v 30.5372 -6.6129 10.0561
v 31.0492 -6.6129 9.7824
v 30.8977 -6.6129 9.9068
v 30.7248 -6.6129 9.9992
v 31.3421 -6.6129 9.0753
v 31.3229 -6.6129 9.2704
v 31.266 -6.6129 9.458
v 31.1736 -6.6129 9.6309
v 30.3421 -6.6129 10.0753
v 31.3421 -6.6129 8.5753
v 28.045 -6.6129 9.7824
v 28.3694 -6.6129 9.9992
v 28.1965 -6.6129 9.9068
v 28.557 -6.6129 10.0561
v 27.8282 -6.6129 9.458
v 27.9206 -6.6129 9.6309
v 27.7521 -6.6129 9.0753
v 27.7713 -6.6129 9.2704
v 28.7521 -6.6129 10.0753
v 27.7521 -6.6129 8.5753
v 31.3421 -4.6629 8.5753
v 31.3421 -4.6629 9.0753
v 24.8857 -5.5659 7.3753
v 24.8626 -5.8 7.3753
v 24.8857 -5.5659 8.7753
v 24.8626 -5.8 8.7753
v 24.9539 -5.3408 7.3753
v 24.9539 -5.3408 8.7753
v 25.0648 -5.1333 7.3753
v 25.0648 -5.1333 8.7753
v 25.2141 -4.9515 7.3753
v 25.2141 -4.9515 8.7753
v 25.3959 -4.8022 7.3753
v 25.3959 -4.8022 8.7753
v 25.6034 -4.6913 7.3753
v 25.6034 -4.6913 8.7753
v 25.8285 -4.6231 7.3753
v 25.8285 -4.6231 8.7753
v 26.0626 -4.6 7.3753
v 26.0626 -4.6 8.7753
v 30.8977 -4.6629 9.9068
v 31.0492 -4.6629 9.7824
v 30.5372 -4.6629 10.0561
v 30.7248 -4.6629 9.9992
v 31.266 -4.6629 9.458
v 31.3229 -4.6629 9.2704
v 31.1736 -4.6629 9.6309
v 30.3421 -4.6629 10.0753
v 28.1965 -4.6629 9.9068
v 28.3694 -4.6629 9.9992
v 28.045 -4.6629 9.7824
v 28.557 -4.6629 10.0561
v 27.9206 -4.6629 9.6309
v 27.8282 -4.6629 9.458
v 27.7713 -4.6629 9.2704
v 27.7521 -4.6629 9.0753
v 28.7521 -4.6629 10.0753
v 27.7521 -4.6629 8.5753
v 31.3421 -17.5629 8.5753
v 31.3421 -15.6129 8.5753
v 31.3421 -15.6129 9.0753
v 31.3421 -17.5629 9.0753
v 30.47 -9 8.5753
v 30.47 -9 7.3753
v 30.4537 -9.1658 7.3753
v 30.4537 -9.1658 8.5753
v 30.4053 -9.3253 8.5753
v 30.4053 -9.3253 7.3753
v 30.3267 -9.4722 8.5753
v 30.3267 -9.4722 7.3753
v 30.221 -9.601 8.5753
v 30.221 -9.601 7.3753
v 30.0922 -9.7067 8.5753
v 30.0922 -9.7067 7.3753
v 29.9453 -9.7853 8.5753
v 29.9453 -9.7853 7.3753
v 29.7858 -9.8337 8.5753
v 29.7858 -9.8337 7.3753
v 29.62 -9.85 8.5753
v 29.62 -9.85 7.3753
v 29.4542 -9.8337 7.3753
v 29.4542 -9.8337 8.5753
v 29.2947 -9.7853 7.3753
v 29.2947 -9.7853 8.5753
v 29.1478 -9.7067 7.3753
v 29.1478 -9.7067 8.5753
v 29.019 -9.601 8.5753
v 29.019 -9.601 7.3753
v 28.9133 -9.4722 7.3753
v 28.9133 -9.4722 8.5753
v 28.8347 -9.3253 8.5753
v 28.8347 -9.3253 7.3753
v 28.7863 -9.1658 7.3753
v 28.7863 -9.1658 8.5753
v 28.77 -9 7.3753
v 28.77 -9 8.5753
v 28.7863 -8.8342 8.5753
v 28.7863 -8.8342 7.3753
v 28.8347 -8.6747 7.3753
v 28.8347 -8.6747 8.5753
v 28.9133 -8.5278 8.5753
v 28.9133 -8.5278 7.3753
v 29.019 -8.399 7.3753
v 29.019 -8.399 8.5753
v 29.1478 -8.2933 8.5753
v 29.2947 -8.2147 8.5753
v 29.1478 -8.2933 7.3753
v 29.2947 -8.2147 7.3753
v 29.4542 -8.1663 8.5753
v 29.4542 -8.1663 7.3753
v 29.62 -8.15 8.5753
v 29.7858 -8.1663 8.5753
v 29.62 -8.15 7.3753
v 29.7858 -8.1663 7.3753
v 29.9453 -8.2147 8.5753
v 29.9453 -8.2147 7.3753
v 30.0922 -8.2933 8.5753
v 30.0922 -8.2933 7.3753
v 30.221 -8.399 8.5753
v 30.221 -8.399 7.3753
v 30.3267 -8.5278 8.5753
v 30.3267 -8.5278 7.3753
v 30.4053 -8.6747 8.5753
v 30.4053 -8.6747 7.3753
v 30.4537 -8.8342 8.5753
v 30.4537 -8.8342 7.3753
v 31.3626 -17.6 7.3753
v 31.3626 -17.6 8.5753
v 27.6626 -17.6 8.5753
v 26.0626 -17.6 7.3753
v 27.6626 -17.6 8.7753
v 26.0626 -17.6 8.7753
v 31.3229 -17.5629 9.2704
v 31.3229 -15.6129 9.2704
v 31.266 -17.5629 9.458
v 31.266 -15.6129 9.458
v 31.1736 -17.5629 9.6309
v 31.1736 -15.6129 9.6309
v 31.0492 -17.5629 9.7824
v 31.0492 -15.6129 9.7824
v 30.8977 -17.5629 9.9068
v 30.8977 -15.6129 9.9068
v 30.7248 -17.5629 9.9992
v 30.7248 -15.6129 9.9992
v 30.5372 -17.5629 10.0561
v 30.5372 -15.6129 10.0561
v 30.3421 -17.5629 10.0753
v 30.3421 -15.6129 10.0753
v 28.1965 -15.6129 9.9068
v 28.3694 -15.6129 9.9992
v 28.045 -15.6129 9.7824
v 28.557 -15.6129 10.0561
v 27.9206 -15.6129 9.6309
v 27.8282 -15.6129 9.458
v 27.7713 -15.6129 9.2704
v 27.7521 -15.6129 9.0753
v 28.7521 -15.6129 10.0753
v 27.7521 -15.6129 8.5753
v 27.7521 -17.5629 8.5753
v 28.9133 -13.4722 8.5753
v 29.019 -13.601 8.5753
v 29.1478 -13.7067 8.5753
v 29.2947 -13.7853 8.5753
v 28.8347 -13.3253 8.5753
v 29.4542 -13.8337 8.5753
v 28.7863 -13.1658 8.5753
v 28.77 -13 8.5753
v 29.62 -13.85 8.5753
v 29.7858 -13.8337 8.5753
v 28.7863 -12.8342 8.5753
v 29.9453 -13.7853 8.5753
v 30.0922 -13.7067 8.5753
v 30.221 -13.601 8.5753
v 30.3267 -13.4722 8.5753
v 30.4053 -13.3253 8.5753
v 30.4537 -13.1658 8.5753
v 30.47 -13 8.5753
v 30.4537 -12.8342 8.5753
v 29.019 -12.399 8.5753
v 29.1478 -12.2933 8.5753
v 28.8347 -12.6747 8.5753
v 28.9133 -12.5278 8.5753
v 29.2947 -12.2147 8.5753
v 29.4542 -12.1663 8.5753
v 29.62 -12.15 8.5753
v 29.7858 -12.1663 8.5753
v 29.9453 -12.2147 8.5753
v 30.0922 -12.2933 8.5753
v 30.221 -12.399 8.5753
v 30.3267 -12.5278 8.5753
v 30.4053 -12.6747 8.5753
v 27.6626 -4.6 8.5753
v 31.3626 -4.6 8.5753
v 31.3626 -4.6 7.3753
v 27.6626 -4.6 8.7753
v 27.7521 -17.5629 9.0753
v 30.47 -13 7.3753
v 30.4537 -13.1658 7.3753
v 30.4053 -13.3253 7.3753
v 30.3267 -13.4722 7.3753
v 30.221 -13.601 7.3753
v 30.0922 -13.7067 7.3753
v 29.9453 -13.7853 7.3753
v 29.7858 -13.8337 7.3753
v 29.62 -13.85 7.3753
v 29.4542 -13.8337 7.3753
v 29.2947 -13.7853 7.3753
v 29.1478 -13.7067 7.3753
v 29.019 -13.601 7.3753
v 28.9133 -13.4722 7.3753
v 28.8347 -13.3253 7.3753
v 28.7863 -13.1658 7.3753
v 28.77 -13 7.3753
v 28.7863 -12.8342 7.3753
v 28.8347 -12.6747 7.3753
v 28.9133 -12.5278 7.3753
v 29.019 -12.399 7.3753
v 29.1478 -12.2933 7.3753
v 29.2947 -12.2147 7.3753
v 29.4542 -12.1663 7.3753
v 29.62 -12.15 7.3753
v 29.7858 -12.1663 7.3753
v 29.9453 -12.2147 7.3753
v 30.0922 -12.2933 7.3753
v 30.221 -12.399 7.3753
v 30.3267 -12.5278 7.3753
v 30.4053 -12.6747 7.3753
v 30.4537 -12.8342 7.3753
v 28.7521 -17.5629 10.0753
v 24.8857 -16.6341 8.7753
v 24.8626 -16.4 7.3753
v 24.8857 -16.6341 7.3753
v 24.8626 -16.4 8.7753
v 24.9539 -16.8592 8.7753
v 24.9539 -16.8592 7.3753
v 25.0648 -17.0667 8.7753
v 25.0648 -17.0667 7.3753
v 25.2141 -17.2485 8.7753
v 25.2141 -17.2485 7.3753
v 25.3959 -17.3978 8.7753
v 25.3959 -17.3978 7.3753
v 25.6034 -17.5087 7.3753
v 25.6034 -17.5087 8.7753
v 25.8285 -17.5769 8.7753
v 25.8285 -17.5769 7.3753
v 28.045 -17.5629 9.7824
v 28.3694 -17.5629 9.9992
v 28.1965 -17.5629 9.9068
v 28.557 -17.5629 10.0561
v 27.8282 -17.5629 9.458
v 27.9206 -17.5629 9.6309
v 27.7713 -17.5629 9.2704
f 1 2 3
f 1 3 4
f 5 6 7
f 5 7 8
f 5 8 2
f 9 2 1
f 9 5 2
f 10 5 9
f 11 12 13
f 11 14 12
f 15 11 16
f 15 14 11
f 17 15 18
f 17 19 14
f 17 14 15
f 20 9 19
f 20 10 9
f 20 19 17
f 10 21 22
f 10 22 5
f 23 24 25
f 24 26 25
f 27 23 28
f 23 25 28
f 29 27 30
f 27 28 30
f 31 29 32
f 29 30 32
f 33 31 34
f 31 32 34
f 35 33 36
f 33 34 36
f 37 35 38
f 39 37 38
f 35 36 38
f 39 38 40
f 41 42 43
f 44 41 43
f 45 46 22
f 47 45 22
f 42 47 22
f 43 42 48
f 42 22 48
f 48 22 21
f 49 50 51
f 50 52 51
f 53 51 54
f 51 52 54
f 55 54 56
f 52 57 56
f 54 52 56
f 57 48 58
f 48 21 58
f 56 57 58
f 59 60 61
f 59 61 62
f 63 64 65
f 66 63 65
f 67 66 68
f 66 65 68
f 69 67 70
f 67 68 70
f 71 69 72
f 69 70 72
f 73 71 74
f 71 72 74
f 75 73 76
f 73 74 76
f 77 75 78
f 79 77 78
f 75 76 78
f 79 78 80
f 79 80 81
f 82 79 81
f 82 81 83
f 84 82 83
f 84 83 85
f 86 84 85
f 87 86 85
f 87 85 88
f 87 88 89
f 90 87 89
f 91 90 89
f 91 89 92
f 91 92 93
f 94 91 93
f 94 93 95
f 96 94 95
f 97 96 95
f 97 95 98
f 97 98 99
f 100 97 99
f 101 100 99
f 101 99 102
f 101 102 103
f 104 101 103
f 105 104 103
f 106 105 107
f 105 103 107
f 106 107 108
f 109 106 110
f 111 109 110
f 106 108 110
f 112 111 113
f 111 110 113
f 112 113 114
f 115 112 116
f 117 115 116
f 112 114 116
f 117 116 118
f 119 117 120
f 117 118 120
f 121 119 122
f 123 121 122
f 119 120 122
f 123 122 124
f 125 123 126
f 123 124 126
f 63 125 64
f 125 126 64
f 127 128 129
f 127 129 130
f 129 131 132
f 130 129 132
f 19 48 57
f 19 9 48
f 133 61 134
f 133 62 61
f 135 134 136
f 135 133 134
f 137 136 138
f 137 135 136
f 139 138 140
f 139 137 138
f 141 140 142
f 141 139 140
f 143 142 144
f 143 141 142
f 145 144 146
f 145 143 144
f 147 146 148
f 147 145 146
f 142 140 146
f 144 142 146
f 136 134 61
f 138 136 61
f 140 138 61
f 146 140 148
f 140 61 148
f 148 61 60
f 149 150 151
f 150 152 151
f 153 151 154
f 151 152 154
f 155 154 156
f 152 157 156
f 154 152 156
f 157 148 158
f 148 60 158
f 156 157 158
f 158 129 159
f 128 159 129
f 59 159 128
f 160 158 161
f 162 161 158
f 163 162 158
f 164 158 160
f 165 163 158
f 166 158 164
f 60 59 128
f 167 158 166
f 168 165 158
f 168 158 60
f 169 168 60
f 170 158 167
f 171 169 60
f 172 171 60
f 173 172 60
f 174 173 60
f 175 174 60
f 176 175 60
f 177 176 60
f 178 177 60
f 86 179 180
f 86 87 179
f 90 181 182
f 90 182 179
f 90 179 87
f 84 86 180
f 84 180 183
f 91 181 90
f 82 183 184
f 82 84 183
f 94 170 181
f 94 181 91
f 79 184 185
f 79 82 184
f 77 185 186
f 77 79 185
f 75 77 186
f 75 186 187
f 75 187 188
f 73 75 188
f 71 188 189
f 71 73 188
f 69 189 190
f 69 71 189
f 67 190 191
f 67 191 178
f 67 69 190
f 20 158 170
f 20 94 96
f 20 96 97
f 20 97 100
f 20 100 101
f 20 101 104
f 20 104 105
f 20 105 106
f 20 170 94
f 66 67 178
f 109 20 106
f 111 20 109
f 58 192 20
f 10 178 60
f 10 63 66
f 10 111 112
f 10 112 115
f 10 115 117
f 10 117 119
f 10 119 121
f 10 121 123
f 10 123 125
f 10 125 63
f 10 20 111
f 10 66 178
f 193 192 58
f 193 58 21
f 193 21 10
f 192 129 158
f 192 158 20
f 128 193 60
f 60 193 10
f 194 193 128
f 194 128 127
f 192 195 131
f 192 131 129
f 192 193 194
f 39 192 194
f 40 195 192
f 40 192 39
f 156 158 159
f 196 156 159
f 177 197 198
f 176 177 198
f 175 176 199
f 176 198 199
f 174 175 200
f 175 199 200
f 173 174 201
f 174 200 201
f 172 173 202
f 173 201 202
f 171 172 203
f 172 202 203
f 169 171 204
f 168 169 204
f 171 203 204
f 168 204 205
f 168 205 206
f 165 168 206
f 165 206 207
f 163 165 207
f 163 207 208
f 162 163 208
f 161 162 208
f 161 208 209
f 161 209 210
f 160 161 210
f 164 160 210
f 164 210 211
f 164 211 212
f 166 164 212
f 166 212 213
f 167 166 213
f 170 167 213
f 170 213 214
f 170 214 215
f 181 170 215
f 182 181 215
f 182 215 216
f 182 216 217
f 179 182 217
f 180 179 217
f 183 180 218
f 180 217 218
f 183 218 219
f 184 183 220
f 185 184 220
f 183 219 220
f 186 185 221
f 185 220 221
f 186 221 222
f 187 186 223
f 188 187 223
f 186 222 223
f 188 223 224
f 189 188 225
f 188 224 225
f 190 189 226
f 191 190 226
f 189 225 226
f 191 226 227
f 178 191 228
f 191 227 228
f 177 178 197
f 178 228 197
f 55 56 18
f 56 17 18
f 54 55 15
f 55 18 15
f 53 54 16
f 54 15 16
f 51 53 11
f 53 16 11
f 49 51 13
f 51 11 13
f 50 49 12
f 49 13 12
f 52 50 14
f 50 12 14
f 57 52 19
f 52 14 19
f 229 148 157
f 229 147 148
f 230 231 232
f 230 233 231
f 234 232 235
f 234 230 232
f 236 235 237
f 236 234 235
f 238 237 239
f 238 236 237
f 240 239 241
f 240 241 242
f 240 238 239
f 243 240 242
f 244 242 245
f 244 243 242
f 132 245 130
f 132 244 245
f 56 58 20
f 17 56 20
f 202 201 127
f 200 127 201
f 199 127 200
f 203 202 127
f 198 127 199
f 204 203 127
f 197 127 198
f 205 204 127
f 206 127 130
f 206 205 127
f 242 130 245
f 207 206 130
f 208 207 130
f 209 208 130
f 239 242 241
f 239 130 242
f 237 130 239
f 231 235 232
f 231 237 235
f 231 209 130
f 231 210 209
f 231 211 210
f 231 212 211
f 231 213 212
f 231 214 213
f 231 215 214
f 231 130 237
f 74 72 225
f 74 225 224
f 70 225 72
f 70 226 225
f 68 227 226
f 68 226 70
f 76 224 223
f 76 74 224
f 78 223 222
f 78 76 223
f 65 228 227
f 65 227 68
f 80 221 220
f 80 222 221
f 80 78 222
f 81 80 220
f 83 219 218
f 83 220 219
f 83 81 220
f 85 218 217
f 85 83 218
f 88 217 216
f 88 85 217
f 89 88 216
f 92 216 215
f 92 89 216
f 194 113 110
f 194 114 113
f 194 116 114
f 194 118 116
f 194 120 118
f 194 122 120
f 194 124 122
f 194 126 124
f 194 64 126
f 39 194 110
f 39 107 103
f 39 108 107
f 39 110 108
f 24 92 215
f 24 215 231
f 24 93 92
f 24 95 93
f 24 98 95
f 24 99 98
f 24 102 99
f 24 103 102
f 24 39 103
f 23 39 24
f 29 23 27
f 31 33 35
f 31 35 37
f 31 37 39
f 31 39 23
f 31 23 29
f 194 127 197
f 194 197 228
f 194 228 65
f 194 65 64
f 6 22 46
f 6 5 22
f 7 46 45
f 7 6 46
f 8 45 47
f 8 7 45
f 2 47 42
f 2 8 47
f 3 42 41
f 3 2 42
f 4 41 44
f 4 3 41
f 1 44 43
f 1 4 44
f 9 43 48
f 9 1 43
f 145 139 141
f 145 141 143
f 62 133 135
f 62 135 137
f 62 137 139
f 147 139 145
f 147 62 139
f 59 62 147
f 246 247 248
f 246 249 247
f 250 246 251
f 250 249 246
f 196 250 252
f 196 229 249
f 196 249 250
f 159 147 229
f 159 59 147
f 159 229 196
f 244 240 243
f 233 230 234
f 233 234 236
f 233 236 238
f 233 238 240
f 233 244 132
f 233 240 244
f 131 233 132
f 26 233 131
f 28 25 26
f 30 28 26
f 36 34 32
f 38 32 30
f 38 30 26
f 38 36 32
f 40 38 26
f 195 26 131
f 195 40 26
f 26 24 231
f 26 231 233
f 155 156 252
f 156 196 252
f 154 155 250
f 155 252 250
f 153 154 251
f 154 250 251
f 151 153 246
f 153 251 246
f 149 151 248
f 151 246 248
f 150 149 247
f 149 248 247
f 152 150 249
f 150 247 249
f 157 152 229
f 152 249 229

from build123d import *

# Parameters (mm, degrees)
PAD023_DEPTH    = 13
SKETCH050_R     = 0.85
POCKET025_DEPTH = 5
FILLET008_R     = 1.2
SKETCH061_W     = 3.59
SKETCH061_H     = 1.95
PAD032_DEPTH    = 1.5
FILLET011_R     = 1


with BuildPart() as part:
    # Sketch049 → Pad023 (new body)
    with BuildSketch(Plane.XZ.offset(-4)):
        Polygon((24.862594, 8.175321), (27.662594, 8.175321), (27.662594, 7.975321), (31.362594, 7.975321), (31.362594, 6.775321), (24.862594, 6.775321), align=None)
    extrude(amount=PAD023_DEPTH)

    # Sketch050 (on Face5 of Pad023) → Pocket025 (cut)
    with BuildSketch(Plane(origin=(0, 0, 6.775321), x_dir=(1, 0, 0), z_dir=(0, 0, -1))):
        with Locations((29.62, 4.4)):
            Circle(SKETCH050_R)
        with Locations((29.62, 0.4)):
            Circle(SKETCH050_R)
    extrude(amount=-POCKET025_DEPTH, mode=Mode.SUBTRACT)

    # Fillet008
    fillet008_edges = [part.edges().sort_by_distance(p)[0] for p in [
        (24.862594, -9, 7.475321),
        (24.862594, 4, 7.475321),
    ]]
    fillet(fillet008_edges, radius=FILLET008_R)

    # Sketch061 (on Face9 of Fillet008) → Pad032 (join)
    with BuildSketch(Plane(origin=(0, 0, 7.975321), x_dir=(-1, 0, 0), z_dir=(0, 0, 1))):
        with Locations((-29.547098, 7.987892)):
            Rectangle(SKETCH061_W, SKETCH061_H)
        with Locations((-29.547098, -2.962108)):
            Rectangle(SKETCH061_W, SKETCH061_H)
    extrude(amount=PAD032_DEPTH)

    # Fillet011
    fillet011_edges = [part.edges().sort_by_distance(p)[0] for p in [
        (27.752098, 2.962108, 9.475321),
        (31.342098, 2.962108, 9.475321),
        (27.752098, -7.987892, 9.475321),
        (31.342098, -7.987892, 9.475321),
    ]]
    fillet(fillet011_edges, radius=FILLET011_R)


with BuildPart() as part_1:
    # Body006 placement: moved
    add(part.part.moved(Location((0, -8.6, 0.6))))


solid = part_1.part
